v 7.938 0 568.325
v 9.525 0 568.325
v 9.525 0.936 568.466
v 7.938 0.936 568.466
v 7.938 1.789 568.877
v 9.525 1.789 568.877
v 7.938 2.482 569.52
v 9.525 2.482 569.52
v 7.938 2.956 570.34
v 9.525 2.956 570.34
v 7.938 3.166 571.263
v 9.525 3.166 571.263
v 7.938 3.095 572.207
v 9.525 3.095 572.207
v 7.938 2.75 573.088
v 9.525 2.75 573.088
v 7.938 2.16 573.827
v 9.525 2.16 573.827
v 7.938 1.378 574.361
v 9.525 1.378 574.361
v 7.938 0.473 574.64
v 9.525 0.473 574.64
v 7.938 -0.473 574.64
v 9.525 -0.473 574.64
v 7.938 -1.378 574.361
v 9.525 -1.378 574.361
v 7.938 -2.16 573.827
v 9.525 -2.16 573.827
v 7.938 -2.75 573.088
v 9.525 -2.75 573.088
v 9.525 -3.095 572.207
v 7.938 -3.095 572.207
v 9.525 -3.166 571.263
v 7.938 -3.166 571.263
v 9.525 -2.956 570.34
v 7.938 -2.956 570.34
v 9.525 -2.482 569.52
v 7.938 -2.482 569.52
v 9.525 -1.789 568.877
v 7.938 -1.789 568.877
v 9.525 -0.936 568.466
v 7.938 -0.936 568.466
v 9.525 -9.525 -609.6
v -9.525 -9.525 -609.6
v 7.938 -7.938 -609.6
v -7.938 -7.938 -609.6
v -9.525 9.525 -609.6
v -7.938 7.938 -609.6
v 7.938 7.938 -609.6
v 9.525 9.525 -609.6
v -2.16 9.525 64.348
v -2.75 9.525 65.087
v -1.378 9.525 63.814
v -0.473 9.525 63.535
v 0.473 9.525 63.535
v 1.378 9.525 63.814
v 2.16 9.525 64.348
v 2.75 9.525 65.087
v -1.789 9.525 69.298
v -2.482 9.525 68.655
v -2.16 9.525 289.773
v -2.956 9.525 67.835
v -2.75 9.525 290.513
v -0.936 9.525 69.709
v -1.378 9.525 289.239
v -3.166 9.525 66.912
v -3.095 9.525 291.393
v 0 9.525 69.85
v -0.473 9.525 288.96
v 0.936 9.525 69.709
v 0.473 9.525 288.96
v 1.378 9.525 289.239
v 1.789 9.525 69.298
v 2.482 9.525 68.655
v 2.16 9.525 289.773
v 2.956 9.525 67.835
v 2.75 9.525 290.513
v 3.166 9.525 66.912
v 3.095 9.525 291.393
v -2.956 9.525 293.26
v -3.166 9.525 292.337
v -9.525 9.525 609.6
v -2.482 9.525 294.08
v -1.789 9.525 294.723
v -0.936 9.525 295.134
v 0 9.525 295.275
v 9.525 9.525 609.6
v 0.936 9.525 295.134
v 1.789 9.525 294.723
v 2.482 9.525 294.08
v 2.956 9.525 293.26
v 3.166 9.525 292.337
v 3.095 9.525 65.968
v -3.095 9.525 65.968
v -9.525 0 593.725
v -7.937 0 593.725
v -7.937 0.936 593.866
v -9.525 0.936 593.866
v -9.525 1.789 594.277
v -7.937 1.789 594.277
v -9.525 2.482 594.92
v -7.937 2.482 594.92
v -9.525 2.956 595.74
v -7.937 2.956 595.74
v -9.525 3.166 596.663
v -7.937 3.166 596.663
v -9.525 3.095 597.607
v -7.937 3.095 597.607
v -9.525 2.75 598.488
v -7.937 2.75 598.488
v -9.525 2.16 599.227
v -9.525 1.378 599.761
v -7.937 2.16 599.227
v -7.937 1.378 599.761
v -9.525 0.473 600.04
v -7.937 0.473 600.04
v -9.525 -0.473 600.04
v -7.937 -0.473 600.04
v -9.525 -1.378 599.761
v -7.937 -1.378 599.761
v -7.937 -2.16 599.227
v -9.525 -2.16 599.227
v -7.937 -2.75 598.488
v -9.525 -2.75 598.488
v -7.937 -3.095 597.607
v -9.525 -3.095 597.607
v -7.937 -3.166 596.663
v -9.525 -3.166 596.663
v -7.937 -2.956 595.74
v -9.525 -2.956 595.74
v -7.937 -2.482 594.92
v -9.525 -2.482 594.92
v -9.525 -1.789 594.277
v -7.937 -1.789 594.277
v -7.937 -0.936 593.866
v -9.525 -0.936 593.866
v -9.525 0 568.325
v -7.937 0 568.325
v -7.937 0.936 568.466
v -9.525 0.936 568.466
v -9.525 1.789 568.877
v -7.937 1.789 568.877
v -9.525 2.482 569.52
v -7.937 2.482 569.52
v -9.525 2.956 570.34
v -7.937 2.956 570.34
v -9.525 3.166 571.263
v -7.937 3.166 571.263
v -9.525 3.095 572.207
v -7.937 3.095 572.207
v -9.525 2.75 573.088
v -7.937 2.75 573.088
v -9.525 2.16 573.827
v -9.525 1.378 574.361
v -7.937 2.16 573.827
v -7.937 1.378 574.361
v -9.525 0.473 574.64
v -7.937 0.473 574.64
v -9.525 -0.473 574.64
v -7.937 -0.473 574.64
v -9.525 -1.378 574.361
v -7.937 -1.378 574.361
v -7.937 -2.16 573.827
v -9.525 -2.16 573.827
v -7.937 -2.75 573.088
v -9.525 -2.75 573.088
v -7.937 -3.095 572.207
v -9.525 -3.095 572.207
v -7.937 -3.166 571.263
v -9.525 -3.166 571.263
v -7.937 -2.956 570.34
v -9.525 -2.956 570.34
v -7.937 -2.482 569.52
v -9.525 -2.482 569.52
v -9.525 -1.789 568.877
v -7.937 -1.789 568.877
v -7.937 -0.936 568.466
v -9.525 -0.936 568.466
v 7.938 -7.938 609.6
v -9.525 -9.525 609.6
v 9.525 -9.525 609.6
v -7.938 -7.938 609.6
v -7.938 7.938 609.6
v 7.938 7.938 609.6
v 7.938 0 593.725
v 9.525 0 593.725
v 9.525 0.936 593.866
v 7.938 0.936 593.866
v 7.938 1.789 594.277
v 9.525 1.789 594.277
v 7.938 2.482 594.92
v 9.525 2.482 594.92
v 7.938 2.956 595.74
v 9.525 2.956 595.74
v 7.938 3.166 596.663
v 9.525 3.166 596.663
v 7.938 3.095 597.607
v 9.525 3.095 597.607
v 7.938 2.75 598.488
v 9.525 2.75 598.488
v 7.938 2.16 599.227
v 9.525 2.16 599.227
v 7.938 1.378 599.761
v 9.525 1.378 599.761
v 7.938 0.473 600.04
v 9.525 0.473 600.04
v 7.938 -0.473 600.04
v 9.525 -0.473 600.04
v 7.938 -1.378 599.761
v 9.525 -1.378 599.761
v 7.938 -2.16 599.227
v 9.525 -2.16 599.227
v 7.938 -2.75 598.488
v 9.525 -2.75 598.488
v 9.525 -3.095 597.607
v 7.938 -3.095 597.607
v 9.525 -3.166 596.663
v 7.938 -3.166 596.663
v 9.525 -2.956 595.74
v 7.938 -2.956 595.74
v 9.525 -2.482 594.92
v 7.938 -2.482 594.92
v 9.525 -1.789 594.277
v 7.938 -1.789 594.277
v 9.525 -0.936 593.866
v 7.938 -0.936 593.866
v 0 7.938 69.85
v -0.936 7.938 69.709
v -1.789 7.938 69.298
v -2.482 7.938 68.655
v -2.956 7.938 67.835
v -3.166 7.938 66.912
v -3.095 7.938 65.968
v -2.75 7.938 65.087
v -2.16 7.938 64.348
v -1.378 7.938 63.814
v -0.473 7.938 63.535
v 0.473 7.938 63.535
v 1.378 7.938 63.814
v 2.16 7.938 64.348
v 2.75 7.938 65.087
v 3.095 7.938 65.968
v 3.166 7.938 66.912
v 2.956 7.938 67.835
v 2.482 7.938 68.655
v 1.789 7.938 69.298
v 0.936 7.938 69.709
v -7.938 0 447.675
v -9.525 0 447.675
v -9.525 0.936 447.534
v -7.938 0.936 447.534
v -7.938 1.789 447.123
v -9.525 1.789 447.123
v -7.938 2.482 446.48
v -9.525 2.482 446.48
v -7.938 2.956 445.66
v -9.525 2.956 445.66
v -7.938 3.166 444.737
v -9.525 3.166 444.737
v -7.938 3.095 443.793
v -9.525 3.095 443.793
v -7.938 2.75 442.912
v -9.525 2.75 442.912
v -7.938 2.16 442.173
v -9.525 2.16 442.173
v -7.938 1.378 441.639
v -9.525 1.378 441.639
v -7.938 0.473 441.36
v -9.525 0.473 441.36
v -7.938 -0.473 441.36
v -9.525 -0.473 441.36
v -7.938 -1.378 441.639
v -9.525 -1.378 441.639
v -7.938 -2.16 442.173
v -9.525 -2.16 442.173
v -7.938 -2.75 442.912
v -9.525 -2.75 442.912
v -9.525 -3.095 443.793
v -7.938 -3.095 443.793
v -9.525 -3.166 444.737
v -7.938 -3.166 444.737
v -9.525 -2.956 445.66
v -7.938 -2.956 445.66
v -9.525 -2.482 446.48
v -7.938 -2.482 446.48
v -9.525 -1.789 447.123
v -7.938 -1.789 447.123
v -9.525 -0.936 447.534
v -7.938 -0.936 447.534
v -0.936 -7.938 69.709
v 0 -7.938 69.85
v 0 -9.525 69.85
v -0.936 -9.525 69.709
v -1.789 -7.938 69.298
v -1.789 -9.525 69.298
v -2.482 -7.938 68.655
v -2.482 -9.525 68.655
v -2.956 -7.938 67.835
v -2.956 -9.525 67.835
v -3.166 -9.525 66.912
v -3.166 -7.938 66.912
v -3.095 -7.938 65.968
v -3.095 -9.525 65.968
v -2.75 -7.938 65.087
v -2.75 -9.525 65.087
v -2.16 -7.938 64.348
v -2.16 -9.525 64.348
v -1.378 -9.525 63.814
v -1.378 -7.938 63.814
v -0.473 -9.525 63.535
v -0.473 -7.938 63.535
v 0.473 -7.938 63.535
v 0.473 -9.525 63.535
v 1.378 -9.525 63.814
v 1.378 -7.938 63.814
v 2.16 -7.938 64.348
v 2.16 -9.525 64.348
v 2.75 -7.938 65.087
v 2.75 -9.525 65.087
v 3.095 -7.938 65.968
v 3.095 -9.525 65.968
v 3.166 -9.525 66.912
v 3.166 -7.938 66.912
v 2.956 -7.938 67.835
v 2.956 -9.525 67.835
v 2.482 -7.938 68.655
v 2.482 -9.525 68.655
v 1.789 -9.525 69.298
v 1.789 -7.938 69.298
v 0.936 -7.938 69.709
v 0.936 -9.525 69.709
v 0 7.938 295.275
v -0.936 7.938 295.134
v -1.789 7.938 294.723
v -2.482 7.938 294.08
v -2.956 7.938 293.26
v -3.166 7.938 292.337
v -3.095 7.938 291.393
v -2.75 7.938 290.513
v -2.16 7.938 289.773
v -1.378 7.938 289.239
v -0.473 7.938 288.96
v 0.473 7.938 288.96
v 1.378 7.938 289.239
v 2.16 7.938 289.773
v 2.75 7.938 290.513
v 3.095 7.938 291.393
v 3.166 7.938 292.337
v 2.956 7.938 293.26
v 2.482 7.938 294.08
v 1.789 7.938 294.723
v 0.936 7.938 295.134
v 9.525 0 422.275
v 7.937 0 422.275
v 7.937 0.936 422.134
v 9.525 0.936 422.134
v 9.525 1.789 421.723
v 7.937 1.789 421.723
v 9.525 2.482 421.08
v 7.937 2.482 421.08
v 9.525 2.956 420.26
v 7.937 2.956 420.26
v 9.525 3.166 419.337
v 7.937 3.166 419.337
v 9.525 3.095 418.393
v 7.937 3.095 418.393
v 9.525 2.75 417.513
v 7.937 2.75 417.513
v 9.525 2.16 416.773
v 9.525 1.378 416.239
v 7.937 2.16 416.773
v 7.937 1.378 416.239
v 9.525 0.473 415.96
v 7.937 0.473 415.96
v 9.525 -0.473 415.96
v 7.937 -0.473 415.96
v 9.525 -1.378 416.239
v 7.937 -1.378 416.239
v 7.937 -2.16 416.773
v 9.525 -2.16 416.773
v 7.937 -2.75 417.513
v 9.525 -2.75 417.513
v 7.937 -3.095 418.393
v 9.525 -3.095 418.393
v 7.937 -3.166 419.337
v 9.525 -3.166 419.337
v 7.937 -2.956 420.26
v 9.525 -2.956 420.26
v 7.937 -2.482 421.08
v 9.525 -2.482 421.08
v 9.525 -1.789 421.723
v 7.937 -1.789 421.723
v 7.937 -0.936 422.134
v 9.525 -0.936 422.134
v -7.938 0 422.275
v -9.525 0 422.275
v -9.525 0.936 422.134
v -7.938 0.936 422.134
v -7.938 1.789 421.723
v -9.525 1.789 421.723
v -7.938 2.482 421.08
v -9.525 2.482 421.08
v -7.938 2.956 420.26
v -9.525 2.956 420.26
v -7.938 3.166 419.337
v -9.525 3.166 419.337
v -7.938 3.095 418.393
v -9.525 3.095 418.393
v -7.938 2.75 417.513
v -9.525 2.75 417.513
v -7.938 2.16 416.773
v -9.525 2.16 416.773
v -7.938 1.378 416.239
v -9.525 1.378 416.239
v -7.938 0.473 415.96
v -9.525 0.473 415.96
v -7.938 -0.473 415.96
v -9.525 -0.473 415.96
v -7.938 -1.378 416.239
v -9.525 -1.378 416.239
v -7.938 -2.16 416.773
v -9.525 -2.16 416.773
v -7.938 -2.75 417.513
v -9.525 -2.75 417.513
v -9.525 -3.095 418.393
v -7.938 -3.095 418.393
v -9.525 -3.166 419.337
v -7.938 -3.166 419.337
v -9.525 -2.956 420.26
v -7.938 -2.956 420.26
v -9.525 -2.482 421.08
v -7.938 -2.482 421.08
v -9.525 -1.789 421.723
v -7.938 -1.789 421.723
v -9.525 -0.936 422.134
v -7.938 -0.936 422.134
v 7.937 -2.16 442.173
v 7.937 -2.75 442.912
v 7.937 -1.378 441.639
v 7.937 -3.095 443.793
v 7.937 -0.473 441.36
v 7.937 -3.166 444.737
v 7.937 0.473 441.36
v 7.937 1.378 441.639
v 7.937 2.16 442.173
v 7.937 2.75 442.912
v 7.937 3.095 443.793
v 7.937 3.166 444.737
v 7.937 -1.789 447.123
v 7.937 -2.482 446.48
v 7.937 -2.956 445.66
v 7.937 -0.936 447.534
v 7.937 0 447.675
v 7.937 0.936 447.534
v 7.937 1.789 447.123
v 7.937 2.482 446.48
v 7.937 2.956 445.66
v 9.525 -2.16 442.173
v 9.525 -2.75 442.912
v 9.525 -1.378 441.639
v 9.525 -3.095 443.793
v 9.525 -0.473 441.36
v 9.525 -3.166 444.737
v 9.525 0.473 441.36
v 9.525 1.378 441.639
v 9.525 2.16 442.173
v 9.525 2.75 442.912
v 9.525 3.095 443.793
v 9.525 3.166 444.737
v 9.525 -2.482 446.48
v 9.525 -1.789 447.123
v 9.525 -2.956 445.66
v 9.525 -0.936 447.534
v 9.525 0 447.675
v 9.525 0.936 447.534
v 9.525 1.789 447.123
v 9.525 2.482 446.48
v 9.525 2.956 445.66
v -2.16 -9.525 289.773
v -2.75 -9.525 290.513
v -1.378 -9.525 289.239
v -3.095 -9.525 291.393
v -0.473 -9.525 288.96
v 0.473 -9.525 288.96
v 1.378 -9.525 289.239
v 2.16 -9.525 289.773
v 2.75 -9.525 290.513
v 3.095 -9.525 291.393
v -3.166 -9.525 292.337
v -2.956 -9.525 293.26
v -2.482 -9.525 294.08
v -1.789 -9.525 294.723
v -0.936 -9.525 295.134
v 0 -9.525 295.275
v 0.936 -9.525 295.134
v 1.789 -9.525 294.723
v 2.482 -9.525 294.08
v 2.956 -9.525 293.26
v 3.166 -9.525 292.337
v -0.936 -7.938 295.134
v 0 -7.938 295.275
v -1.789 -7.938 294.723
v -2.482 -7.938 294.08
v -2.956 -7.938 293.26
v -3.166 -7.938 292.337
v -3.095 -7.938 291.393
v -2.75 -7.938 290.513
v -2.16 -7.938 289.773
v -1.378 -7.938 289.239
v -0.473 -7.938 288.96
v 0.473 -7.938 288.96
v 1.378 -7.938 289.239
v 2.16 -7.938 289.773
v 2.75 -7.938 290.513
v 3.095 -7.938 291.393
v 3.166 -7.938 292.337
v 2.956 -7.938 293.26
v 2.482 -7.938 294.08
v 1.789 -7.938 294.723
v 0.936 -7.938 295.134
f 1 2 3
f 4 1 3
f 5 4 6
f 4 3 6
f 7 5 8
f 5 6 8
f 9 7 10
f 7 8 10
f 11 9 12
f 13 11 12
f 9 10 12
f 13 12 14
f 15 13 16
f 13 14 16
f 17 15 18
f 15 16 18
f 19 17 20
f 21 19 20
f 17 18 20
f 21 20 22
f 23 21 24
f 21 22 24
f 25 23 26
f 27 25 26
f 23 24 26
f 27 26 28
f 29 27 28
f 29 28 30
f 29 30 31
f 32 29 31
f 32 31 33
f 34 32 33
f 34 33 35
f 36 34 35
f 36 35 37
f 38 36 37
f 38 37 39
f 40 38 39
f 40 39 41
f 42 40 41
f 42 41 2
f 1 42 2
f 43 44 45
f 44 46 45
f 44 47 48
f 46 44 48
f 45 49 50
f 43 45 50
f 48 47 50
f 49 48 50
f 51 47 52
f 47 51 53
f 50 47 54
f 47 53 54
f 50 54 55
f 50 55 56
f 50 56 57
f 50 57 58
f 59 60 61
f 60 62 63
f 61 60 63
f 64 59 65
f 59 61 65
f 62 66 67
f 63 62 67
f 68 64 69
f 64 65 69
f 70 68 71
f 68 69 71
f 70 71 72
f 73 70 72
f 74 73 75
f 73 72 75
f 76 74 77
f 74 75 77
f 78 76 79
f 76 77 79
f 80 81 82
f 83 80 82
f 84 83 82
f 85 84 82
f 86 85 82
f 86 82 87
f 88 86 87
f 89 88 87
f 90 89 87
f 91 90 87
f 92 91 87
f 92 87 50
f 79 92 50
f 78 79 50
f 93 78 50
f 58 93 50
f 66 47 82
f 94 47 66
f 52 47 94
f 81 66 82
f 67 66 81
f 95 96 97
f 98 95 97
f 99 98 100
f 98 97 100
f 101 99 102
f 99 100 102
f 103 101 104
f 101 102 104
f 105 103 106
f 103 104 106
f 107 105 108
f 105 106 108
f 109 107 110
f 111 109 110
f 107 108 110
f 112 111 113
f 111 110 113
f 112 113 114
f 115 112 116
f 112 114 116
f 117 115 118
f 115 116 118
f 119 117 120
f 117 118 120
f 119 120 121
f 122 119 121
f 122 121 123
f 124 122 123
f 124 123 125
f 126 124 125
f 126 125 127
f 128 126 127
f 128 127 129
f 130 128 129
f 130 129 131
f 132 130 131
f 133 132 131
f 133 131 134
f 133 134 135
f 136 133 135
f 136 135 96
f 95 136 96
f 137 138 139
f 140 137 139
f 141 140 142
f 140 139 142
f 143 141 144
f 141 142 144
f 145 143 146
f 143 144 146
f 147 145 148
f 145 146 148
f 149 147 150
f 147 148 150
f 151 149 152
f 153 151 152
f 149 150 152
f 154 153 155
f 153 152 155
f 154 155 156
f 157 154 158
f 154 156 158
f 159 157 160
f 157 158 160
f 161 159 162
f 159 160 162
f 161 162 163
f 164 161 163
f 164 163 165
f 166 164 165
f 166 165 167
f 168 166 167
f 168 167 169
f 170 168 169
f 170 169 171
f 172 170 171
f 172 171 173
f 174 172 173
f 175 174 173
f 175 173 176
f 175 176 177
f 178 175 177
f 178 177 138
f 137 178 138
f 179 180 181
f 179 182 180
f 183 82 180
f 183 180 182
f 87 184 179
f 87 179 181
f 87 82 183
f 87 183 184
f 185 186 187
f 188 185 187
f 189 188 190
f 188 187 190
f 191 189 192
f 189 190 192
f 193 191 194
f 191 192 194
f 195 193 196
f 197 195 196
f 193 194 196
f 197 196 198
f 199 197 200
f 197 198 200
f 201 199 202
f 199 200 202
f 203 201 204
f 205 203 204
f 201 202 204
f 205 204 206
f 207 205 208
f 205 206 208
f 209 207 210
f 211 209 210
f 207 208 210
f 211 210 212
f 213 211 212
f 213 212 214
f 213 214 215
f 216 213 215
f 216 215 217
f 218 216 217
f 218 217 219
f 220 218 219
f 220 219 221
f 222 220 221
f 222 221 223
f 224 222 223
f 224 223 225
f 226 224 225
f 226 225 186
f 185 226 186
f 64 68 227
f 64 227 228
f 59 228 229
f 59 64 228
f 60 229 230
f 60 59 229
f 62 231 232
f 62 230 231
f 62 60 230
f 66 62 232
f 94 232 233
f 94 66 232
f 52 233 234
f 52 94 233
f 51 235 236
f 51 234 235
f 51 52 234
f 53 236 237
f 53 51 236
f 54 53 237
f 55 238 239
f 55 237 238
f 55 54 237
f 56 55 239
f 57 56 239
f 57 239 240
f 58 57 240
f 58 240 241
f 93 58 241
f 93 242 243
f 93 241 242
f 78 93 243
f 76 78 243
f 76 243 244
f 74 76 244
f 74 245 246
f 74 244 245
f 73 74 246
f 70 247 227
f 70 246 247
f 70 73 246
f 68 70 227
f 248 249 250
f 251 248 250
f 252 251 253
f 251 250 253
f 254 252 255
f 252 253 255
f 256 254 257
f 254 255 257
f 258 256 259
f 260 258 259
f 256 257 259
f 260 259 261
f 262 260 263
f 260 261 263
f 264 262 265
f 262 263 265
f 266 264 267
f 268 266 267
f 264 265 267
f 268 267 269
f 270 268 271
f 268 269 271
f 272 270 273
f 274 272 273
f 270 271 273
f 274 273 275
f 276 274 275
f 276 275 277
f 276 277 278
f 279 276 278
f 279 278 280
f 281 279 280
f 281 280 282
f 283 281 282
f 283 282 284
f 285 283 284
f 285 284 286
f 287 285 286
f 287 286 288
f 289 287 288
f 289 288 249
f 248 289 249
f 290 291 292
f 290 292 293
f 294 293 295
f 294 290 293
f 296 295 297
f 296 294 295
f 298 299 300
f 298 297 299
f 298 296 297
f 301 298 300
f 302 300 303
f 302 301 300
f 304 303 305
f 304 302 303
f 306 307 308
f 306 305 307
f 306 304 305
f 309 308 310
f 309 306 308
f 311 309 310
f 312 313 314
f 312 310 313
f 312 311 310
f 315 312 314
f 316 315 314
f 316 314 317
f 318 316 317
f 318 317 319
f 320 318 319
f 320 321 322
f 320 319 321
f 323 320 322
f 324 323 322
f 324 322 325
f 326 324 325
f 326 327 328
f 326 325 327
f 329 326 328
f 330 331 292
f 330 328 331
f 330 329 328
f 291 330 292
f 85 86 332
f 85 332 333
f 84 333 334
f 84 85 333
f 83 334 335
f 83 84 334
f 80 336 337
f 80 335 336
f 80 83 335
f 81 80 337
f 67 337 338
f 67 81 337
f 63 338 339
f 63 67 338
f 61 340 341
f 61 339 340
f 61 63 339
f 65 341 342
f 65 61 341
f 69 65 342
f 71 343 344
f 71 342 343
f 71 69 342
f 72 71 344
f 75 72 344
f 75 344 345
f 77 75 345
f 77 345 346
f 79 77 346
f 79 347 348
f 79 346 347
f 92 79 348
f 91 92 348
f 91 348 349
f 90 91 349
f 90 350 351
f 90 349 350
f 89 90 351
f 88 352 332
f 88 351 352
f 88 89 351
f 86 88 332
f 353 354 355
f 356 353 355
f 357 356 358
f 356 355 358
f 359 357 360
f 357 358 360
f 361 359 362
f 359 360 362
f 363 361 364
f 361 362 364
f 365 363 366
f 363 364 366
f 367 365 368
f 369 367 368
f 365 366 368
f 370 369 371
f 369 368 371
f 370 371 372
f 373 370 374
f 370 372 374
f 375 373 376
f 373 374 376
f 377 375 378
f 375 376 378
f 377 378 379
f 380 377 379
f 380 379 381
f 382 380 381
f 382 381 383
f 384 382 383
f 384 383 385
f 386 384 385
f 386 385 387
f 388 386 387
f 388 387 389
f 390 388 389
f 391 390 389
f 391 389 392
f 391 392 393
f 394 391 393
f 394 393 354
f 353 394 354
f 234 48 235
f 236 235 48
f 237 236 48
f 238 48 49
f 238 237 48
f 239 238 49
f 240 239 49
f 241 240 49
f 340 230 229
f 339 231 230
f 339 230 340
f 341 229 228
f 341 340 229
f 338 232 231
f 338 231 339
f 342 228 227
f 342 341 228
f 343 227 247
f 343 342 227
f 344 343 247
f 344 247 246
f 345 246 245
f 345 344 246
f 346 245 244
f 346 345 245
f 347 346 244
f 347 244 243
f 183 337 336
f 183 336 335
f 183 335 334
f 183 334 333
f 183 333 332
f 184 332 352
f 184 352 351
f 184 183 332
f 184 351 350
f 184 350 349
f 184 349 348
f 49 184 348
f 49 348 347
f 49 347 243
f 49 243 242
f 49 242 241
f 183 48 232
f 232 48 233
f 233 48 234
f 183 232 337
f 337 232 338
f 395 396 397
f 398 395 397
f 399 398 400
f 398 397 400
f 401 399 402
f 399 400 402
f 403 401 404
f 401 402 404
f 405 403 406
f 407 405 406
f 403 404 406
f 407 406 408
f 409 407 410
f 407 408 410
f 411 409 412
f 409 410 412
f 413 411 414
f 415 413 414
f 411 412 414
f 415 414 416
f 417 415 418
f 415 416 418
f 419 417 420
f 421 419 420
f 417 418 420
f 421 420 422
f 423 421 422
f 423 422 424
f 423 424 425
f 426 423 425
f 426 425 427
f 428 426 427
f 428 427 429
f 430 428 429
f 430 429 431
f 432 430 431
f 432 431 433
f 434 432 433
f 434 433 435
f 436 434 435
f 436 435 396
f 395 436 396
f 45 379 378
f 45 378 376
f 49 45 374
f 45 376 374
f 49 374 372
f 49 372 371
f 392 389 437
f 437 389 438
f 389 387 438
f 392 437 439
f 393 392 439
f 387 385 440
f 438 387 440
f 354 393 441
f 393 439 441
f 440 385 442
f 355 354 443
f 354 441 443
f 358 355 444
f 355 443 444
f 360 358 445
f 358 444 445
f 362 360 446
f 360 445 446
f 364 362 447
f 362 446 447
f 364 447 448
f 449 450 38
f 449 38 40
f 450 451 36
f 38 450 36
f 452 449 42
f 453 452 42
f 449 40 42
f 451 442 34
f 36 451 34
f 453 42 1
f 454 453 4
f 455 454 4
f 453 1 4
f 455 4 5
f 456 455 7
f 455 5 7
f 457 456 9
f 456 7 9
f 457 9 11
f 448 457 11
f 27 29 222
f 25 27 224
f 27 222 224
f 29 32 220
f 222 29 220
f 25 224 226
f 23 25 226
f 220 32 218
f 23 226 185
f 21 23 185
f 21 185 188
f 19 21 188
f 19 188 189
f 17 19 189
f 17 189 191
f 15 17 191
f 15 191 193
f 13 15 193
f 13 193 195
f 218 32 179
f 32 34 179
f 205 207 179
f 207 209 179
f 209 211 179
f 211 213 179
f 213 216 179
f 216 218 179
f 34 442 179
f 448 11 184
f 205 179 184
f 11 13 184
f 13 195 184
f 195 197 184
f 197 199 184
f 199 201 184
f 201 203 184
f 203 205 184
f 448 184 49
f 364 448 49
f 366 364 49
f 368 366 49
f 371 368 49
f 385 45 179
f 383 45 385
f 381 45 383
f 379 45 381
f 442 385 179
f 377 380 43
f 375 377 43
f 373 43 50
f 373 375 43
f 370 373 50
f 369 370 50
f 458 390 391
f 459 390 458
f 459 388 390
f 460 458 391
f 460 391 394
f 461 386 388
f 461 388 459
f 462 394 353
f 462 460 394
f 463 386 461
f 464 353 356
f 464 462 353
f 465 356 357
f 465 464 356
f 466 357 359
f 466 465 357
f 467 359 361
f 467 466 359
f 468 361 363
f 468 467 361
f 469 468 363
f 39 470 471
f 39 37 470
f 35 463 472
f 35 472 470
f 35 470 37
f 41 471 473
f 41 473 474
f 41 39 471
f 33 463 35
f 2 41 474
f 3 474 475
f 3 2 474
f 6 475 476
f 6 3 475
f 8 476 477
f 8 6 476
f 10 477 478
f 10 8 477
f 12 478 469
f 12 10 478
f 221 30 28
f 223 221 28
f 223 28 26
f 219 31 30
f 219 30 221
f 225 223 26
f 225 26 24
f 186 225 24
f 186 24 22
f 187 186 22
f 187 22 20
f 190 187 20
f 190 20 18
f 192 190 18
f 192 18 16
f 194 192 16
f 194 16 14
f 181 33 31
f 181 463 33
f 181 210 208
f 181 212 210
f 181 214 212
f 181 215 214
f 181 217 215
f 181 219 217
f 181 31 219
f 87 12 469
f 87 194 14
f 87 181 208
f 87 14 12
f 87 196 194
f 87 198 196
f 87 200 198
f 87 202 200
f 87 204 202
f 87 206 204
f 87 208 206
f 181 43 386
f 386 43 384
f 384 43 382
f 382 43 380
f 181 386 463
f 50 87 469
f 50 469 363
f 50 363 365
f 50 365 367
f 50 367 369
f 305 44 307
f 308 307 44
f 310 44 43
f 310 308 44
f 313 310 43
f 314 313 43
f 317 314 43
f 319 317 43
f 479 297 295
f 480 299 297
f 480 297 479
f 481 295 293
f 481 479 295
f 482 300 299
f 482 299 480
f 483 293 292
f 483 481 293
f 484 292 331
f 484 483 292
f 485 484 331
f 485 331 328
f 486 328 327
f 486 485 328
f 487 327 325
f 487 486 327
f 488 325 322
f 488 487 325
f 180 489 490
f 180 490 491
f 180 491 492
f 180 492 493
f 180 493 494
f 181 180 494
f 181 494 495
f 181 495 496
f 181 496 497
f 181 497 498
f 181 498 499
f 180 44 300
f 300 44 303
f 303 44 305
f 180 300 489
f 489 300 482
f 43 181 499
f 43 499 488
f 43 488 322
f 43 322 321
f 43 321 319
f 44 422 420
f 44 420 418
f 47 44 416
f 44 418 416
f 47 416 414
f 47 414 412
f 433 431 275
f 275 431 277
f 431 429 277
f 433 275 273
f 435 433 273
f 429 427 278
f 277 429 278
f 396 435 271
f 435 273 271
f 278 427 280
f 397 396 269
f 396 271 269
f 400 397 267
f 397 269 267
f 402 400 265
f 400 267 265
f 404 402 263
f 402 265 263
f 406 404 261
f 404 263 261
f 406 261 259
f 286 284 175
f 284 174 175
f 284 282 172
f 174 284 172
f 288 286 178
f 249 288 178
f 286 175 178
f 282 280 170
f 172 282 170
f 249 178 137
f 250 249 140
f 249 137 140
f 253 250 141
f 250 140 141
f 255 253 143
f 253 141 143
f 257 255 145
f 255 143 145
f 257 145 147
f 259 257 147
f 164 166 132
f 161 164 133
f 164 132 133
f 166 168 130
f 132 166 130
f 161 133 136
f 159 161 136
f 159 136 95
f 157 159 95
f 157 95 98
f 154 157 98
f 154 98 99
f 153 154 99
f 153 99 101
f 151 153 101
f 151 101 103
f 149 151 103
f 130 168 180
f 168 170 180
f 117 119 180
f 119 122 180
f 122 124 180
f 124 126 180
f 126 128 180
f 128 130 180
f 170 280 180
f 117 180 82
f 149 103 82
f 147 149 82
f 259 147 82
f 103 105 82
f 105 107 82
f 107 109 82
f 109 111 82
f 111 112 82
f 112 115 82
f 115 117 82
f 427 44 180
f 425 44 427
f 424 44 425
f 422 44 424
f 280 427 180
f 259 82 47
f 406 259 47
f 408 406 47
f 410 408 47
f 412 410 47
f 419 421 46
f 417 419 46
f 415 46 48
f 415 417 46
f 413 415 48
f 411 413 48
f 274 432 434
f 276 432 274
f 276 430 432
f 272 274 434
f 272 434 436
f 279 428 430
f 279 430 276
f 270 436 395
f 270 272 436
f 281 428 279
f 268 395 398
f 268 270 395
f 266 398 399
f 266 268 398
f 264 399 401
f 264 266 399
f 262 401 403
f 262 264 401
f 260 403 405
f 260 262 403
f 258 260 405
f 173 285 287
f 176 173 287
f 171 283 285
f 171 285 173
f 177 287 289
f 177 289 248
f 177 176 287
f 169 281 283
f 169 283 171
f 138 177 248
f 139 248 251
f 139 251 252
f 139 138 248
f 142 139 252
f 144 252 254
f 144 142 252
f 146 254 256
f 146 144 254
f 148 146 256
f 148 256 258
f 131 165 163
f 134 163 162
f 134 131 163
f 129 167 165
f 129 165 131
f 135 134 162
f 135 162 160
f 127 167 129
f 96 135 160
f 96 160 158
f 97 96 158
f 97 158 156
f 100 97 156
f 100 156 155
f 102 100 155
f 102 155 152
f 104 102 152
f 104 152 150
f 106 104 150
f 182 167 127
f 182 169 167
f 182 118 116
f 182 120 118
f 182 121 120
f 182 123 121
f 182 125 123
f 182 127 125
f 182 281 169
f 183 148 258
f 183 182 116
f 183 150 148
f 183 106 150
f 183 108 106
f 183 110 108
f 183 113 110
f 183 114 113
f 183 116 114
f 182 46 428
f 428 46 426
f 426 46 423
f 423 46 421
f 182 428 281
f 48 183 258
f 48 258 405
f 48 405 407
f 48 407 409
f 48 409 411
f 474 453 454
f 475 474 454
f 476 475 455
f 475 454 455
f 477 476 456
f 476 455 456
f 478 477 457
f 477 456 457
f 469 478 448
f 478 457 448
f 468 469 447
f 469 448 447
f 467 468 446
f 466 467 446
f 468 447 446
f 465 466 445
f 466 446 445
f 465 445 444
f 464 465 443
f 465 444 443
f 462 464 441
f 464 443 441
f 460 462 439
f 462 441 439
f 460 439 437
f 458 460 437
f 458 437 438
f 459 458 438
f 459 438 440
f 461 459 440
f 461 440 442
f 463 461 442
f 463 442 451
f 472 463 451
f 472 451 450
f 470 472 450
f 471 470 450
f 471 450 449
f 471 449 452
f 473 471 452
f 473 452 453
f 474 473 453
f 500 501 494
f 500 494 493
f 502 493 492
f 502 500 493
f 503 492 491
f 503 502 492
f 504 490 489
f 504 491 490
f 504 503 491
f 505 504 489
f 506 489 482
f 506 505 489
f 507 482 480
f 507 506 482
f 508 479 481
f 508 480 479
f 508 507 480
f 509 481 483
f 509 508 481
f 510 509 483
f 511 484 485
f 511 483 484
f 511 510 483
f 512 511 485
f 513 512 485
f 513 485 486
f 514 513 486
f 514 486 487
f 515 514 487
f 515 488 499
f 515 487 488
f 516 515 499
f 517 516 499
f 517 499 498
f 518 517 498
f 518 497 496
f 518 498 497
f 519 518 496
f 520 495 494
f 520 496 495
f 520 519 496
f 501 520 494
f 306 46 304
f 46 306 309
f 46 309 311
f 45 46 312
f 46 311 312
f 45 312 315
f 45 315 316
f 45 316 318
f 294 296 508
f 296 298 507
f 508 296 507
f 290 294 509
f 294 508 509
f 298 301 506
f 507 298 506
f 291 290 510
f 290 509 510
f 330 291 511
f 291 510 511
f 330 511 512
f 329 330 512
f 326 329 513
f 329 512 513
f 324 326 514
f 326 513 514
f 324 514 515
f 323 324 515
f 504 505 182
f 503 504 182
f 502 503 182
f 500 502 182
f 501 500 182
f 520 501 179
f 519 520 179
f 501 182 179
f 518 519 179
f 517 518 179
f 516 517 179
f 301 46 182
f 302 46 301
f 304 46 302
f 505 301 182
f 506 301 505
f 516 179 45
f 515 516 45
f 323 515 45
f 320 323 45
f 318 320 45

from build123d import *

# Parameters (mm, degrees)
SKETCH1_W               = 19.05
SKETCH1_H               = 19.05
SKETCH1_W_2             = 15.875
SKETCH1_H_2             = 15.875
BOSS_EXTRUDE1_DEPTH     = 609.6
SKETCH3_R               = 3.175
CUT_EXTRUDE1_DEPTH      = 610.971956835
SKETCH4_R               = 3.175
CUT_EXTRUDE2_DEPTH      = 610.971956835
CUT_EXTRUDE4_DEPTH      = 610.971956835
CUT_EXTRUDE4_DEPTH_BACK = 610.971956835
SKETCH7_R               = 3.175


with BuildPart() as part:
    # Sketch1 → Boss-Extrude1 (new, symmetric)
    with BuildSketch(Plane.XY):
        Rectangle(SKETCH1_W, SKETCH1_H)
        Rectangle(SKETCH1_W_2, SKETCH1_H_2, mode=Mode.SUBTRACT)
    extrude(amount=BOSS_EXTRUDE1_DEPTH, both=True)

    # Sketch3 → Cut-Extrude1 (cut, through all)
    with BuildSketch(Plane(origin=(9.525, 0, 0), x_dir=(0, 0, -1), z_dir=(1, 0, 0))):
        with Locations((-571.5, 0)):
            Circle(SKETCH3_R)
        with Locations((-596.9, 0)):
            Circle(SKETCH3_R)
    extrude(amount=-CUT_EXTRUDE1_DEPTH, mode=Mode.SUBTRACT)

    # Sketch4 → Cut-Extrude2 (cut, through all)
    with BuildSketch(Plane.ZY.offset(9.525)):
        with Locations((444.5, 0)):
            Circle(SKETCH4_R)
        with Locations((419.1, 0)):
            Circle(SKETCH4_R)
    extrude(amount=-CUT_EXTRUDE2_DEPTH, mode=Mode.SUBTRACT)

    # Sketch7 → Cut-Extrude4 (cut, two sides: drawn at the far end of the back side and taken through both)
    with BuildSketch(Plane.XZ.offset(9.525).offset(-CUT_EXTRUDE4_DEPTH_BACK)):
        with Locations(Location((0, 292.1, 0), (0, 0, 90))):
            Circle(SKETCH7_R)
        with Locations(Location((0, 66.675, 0), (0, 0, 90))):
            Circle(SKETCH7_R)
    extrude(amount=CUT_EXTRUDE4_DEPTH + CUT_EXTRUDE4_DEPTH_BACK, mode=Mode.SUBTRACT)


solid = part.part
